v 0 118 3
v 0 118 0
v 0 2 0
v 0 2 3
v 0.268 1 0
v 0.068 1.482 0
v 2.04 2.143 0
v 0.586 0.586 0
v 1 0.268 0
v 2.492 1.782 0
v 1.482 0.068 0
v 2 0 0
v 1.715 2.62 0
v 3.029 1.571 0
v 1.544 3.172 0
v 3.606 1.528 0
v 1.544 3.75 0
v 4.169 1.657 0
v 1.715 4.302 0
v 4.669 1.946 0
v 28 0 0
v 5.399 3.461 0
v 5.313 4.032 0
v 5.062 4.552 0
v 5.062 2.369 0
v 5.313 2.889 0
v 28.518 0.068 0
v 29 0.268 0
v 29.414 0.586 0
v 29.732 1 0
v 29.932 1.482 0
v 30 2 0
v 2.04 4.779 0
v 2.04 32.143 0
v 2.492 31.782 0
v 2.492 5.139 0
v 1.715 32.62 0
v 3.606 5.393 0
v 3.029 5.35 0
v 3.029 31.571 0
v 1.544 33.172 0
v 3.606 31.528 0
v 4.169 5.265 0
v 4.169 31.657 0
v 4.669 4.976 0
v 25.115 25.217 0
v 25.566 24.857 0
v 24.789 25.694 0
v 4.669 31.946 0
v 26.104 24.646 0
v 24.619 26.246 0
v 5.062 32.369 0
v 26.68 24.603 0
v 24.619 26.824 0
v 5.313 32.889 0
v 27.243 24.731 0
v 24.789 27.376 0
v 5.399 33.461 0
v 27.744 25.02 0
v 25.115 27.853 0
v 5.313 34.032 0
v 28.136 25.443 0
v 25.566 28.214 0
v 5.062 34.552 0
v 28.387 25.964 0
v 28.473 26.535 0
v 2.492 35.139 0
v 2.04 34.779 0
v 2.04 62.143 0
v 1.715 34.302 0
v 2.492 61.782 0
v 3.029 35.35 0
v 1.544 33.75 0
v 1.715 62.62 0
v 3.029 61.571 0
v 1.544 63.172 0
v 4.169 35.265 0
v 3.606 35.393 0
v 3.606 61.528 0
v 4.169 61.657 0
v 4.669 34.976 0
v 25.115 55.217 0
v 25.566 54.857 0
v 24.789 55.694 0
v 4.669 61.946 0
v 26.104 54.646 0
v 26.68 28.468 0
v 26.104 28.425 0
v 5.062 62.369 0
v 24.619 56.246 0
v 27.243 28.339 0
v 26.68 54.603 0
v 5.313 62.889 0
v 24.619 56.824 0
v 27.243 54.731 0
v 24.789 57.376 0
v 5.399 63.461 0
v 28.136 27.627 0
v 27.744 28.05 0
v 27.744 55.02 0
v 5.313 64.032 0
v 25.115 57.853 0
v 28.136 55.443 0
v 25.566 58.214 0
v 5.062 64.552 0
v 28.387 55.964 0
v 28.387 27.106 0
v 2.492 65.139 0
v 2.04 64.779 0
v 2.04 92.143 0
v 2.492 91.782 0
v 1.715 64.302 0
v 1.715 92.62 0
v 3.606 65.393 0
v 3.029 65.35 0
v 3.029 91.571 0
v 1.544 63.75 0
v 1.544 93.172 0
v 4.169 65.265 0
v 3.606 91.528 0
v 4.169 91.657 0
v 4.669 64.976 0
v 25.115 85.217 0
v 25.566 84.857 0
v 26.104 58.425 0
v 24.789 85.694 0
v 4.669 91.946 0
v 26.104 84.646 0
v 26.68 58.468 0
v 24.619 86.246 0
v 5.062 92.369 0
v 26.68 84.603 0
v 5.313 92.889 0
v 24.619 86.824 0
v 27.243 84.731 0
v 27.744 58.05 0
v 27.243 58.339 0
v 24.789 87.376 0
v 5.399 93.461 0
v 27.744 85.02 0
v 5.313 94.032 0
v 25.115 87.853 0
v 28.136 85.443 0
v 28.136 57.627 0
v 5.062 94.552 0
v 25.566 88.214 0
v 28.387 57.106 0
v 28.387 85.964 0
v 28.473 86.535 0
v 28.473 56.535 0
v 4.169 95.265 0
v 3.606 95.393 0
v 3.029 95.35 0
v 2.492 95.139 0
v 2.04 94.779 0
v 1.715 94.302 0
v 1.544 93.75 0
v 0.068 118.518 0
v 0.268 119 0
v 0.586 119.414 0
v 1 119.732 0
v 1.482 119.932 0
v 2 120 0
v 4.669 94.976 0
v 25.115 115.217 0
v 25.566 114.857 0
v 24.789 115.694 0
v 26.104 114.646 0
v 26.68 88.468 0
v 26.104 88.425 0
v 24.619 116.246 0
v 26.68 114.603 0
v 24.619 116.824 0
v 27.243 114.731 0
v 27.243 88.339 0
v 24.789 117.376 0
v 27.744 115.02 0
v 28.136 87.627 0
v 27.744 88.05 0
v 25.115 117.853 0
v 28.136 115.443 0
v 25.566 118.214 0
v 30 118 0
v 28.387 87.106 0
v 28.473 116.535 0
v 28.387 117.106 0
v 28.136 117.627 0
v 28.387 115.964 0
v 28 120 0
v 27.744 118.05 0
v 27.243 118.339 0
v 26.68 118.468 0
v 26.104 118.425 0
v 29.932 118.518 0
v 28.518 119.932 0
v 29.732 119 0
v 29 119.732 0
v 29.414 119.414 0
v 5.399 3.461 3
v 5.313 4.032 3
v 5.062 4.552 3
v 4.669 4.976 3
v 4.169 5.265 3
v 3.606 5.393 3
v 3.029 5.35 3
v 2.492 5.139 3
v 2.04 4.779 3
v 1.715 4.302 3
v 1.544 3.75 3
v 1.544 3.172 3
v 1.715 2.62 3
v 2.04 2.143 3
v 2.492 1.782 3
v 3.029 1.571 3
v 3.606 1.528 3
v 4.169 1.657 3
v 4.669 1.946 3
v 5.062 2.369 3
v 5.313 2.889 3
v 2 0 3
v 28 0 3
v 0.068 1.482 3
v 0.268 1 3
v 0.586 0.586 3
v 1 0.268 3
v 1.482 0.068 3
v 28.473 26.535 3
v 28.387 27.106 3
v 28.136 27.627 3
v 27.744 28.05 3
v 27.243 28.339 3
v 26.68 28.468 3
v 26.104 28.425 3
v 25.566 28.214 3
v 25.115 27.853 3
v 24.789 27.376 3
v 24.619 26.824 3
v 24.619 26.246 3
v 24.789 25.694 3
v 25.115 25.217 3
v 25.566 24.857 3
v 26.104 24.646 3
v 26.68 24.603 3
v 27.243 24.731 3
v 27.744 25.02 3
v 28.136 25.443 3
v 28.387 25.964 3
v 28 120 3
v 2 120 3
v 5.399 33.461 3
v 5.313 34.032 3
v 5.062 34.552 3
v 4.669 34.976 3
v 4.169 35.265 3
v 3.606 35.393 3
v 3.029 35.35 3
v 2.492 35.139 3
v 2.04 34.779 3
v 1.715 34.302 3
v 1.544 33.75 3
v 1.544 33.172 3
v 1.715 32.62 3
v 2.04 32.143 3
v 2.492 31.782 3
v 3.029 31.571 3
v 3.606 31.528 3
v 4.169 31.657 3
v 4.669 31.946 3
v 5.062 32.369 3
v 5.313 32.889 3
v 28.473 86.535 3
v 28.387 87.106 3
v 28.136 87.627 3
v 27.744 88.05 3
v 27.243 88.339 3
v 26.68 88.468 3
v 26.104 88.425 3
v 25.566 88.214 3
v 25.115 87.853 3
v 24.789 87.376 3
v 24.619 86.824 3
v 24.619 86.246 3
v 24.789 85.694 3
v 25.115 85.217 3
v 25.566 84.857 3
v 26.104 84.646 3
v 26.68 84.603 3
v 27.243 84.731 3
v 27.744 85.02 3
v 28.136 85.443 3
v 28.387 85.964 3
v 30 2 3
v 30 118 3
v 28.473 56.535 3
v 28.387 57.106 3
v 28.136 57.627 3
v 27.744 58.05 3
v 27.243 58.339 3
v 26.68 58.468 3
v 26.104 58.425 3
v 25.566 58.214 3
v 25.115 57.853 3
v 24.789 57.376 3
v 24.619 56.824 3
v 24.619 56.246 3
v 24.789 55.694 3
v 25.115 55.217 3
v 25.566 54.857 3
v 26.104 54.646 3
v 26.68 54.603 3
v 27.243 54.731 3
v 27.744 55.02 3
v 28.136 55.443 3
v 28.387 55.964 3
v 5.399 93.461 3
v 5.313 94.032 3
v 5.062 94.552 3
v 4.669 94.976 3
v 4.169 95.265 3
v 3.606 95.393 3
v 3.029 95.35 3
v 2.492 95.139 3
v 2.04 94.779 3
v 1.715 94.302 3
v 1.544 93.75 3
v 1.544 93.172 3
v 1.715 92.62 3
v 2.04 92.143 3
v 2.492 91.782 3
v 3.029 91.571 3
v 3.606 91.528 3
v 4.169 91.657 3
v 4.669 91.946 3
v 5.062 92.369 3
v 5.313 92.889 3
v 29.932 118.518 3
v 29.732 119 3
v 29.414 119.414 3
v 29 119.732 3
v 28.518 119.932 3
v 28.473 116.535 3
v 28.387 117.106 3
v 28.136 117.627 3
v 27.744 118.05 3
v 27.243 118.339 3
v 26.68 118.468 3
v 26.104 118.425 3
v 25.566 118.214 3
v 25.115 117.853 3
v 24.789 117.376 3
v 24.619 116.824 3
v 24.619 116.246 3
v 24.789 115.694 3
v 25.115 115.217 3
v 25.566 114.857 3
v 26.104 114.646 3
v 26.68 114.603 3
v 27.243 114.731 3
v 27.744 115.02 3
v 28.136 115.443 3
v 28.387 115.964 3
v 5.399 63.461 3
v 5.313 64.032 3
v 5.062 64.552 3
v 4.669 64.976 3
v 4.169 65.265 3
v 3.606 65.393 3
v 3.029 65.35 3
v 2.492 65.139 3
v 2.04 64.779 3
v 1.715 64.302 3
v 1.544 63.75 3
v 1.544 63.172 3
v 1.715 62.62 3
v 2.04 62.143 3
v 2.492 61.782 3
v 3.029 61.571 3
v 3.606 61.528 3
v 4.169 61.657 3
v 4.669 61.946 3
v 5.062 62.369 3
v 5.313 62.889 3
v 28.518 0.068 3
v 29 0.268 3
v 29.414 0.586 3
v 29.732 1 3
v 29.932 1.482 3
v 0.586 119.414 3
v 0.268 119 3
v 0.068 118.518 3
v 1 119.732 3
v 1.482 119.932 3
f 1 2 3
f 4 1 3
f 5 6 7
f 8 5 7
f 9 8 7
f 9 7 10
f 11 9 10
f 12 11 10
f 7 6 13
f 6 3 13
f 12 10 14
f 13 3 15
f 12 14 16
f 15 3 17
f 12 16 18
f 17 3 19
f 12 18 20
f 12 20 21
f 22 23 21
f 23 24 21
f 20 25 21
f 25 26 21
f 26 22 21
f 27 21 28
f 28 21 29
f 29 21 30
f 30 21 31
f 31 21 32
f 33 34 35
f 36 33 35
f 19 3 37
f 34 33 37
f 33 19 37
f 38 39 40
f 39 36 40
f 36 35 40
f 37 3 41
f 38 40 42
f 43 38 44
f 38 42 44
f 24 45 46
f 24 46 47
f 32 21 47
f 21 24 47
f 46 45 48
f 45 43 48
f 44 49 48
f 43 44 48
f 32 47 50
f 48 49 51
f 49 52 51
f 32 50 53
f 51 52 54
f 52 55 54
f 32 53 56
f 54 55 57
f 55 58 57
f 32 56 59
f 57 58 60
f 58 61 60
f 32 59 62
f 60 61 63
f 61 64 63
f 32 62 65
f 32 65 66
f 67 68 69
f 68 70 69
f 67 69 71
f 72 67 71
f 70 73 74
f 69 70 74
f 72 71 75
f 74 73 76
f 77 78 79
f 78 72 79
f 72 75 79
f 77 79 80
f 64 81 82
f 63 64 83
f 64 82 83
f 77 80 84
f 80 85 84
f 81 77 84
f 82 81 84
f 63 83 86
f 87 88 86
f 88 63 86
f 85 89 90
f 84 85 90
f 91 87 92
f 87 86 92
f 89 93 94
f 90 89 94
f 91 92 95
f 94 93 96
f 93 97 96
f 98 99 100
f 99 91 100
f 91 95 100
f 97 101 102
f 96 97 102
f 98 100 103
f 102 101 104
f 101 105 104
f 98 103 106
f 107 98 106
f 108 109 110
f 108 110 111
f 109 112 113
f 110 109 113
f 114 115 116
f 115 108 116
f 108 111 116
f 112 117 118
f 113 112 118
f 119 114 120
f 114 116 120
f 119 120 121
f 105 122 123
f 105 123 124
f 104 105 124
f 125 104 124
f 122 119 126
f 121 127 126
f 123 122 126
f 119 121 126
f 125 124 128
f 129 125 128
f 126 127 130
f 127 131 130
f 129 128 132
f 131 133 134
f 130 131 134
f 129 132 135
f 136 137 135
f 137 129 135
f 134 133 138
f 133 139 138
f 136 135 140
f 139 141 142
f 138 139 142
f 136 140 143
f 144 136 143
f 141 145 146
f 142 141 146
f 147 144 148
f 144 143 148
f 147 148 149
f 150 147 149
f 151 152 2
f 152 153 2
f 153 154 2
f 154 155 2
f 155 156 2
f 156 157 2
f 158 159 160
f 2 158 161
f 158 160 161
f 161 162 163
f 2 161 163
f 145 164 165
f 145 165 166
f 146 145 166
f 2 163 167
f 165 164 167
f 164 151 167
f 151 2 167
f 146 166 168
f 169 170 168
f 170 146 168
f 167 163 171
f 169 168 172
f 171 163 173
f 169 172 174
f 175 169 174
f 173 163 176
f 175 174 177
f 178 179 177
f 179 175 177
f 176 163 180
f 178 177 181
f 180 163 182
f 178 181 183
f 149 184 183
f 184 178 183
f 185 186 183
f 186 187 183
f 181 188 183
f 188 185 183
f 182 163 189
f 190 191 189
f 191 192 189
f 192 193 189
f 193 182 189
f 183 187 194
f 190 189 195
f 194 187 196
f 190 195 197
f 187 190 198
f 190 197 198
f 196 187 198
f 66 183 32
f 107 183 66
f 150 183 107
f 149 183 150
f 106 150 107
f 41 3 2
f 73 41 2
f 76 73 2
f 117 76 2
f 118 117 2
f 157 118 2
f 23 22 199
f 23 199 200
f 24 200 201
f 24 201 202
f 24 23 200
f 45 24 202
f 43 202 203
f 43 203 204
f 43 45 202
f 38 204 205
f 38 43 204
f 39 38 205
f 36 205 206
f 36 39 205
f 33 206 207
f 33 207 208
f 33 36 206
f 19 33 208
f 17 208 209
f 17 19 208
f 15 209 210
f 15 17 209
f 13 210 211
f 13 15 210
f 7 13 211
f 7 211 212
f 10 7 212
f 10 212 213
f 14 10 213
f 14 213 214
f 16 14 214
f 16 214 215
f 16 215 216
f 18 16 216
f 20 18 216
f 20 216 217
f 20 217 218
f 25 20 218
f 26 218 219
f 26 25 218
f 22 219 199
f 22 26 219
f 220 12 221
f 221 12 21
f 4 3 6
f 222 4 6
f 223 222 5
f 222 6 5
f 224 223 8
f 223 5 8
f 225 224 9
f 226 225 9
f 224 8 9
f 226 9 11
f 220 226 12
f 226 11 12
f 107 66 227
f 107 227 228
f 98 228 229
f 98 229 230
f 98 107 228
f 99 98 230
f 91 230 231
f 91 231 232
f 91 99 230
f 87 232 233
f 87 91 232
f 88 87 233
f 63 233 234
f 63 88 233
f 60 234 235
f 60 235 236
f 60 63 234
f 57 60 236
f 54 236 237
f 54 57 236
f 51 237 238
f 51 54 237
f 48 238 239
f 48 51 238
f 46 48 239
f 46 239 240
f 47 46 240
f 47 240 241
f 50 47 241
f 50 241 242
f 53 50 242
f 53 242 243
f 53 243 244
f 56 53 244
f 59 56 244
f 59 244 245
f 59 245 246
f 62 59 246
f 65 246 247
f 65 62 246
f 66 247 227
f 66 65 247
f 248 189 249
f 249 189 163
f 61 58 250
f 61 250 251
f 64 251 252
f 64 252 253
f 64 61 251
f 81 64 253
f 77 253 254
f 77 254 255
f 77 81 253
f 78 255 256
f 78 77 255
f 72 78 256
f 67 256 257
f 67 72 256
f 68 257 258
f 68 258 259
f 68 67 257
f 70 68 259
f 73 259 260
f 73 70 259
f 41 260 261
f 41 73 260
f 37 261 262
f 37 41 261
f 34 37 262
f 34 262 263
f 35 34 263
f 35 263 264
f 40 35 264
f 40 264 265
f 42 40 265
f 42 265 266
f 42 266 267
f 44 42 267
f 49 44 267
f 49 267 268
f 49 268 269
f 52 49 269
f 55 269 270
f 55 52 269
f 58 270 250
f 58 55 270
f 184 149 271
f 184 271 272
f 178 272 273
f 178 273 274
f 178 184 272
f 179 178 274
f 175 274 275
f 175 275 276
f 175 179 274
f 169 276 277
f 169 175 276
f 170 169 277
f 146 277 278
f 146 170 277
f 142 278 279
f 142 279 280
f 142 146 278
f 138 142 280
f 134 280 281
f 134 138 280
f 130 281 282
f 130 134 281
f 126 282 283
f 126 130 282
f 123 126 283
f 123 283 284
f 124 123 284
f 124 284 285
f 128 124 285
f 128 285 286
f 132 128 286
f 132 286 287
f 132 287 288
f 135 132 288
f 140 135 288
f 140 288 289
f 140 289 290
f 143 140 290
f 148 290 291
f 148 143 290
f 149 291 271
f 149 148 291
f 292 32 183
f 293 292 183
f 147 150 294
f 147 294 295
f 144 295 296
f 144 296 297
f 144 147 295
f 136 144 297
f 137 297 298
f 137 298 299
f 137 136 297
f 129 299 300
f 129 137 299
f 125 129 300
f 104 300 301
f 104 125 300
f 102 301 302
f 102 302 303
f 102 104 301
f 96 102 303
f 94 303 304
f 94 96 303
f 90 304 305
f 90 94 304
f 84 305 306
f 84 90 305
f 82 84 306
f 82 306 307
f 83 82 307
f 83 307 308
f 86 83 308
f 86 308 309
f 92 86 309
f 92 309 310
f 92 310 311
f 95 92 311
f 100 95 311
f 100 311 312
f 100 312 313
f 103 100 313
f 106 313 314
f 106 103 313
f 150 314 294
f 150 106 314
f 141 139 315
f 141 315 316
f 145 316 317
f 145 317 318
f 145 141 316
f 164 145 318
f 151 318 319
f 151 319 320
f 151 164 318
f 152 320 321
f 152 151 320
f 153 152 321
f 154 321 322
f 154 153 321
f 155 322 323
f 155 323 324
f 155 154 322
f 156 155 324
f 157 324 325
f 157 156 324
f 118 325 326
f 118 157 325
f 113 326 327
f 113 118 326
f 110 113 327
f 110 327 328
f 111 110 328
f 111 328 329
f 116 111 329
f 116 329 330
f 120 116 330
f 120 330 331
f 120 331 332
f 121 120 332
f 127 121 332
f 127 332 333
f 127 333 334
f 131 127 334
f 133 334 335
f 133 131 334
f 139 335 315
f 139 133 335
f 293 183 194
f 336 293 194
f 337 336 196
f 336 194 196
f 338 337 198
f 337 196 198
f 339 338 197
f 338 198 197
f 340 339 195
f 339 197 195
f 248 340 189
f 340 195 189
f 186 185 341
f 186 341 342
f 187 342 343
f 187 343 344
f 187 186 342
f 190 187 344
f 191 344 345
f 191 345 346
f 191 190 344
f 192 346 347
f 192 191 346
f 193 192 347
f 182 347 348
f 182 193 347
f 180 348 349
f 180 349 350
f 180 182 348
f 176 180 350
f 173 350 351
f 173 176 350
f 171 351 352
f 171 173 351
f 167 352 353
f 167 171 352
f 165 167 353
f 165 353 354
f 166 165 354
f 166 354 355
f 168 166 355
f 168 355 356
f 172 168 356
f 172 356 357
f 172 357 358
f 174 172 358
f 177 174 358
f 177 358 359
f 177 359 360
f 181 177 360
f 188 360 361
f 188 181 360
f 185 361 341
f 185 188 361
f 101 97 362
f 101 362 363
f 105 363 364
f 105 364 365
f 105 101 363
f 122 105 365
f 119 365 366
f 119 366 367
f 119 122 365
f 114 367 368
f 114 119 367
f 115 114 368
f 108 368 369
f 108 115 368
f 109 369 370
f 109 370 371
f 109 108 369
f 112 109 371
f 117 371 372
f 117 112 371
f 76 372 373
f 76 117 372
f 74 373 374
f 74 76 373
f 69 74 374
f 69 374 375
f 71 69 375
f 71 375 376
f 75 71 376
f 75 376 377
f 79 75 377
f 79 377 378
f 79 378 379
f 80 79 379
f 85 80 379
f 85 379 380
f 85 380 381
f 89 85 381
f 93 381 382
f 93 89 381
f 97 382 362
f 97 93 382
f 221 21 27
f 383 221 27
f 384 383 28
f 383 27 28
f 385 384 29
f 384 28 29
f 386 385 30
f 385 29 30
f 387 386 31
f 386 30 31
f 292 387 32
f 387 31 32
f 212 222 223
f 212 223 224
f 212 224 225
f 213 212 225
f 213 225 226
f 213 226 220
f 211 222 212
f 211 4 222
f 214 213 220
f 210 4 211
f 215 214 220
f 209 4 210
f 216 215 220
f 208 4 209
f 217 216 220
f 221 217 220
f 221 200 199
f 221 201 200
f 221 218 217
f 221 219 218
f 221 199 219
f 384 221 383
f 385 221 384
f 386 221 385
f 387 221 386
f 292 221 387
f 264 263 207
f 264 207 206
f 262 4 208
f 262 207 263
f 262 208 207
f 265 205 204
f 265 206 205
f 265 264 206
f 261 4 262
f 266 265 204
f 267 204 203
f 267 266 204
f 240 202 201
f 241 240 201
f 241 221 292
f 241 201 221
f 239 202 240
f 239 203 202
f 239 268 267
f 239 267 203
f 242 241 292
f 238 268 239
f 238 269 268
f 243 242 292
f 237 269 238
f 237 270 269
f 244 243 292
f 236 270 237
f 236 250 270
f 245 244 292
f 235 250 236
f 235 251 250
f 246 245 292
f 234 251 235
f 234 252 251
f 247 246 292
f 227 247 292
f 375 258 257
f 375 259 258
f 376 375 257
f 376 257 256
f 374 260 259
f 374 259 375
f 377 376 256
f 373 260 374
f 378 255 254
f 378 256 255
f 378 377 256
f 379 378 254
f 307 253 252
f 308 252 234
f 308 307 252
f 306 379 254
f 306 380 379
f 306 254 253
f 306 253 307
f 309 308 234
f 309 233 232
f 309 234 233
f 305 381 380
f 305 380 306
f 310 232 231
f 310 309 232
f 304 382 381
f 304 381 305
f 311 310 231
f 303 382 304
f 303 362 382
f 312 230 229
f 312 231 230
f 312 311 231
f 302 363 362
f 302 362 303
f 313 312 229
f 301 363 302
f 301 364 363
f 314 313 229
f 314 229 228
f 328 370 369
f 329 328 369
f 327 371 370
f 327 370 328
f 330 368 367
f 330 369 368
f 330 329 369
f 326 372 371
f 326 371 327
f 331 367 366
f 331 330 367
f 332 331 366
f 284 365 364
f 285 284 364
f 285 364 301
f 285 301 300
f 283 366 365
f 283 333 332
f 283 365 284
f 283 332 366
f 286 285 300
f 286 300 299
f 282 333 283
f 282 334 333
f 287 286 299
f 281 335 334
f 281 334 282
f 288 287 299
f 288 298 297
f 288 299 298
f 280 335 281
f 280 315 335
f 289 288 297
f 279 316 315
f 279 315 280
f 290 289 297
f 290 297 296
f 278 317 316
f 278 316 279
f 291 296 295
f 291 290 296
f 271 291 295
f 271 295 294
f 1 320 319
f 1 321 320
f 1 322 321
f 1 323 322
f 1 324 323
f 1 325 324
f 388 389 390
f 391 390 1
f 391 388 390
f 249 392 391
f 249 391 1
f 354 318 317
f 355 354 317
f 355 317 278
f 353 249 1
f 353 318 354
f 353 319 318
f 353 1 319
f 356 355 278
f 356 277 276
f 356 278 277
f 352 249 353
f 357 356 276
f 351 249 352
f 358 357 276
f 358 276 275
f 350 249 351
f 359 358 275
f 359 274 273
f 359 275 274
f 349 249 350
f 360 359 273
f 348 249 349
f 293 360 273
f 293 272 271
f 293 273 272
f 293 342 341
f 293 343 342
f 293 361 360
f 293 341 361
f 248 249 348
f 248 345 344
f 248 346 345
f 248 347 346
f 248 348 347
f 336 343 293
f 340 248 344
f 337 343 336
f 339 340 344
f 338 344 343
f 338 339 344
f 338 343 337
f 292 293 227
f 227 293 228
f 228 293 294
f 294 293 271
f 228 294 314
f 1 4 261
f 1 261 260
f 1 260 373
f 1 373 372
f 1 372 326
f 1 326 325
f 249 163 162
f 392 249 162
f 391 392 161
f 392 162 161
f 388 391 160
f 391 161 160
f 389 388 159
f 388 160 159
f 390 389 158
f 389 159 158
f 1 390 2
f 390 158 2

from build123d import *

# Parameters (mm, degrees)
BOSS_EXTRU_1_DEPTH   = 3
EMPREINTE1_OUTLINE_R = 1.938
EMPREINTE1_DEPTH     = 3


# Read off the part's stored shape, not the designer's step: Empreinte1
with BuildPart() as part:
    # Esquisse1 → Boss.-Extru.1 (new body)
    with BuildSketch(Plane.XY):
        with BuildLine():
            Line((2, 0), (28, 0))
            ThreePointArc((28, 0), (29.414213562, 0.585786438), (30, 2))
            Line((30, 2), (30, 118))
            ThreePointArc((30, 118), (29.414213562, 119.414213562), (28, 120))
            Line((28, 120), (2, 120))
            ThreePointArc((2, 120), (0.585786438, 119.414213562), (0, 118))
            Line((0, 118), (0, 2))
            ThreePointArc((0, 2), (0.585786438, 0.585786438), (2, 0))
        make_face()
    extrude(amount=BOSS_EXTRU_1_DEPTH)

    # Empreinte1 outline → Empreinte1 (cut)
    with BuildSketch(Plane.XY):
        with Locations((26.535185944, 116.535185944)):
            Circle(EMPREINTE1_OUTLINE_R)
        with Locations((3.460697179, 93.460697179)):
            Circle(EMPREINTE1_OUTLINE_R)
        with Locations((26.535185944, 86.535185944)):
            Circle(EMPREINTE1_OUTLINE_R)
        with Locations((3.460697179, 63.460697179)):
            Circle(EMPREINTE1_OUTLINE_R)
        with Locations((26.535185944, 56.535185944)):
            Circle(EMPREINTE1_OUTLINE_R)
        with Locations((3.460697179, 33.460697179)):
            Circle(EMPREINTE1_OUTLINE_R)
        with Locations((26.535185944, 26.535185944)):
            Circle(EMPREINTE1_OUTLINE_R)
        with Locations((3.460697179, 3.460697179)):
            Circle(EMPREINTE1_OUTLINE_R)
    extrude(amount=EMPREINTE1_DEPTH, mode=Mode.SUBTRACT)


solid = part.part
